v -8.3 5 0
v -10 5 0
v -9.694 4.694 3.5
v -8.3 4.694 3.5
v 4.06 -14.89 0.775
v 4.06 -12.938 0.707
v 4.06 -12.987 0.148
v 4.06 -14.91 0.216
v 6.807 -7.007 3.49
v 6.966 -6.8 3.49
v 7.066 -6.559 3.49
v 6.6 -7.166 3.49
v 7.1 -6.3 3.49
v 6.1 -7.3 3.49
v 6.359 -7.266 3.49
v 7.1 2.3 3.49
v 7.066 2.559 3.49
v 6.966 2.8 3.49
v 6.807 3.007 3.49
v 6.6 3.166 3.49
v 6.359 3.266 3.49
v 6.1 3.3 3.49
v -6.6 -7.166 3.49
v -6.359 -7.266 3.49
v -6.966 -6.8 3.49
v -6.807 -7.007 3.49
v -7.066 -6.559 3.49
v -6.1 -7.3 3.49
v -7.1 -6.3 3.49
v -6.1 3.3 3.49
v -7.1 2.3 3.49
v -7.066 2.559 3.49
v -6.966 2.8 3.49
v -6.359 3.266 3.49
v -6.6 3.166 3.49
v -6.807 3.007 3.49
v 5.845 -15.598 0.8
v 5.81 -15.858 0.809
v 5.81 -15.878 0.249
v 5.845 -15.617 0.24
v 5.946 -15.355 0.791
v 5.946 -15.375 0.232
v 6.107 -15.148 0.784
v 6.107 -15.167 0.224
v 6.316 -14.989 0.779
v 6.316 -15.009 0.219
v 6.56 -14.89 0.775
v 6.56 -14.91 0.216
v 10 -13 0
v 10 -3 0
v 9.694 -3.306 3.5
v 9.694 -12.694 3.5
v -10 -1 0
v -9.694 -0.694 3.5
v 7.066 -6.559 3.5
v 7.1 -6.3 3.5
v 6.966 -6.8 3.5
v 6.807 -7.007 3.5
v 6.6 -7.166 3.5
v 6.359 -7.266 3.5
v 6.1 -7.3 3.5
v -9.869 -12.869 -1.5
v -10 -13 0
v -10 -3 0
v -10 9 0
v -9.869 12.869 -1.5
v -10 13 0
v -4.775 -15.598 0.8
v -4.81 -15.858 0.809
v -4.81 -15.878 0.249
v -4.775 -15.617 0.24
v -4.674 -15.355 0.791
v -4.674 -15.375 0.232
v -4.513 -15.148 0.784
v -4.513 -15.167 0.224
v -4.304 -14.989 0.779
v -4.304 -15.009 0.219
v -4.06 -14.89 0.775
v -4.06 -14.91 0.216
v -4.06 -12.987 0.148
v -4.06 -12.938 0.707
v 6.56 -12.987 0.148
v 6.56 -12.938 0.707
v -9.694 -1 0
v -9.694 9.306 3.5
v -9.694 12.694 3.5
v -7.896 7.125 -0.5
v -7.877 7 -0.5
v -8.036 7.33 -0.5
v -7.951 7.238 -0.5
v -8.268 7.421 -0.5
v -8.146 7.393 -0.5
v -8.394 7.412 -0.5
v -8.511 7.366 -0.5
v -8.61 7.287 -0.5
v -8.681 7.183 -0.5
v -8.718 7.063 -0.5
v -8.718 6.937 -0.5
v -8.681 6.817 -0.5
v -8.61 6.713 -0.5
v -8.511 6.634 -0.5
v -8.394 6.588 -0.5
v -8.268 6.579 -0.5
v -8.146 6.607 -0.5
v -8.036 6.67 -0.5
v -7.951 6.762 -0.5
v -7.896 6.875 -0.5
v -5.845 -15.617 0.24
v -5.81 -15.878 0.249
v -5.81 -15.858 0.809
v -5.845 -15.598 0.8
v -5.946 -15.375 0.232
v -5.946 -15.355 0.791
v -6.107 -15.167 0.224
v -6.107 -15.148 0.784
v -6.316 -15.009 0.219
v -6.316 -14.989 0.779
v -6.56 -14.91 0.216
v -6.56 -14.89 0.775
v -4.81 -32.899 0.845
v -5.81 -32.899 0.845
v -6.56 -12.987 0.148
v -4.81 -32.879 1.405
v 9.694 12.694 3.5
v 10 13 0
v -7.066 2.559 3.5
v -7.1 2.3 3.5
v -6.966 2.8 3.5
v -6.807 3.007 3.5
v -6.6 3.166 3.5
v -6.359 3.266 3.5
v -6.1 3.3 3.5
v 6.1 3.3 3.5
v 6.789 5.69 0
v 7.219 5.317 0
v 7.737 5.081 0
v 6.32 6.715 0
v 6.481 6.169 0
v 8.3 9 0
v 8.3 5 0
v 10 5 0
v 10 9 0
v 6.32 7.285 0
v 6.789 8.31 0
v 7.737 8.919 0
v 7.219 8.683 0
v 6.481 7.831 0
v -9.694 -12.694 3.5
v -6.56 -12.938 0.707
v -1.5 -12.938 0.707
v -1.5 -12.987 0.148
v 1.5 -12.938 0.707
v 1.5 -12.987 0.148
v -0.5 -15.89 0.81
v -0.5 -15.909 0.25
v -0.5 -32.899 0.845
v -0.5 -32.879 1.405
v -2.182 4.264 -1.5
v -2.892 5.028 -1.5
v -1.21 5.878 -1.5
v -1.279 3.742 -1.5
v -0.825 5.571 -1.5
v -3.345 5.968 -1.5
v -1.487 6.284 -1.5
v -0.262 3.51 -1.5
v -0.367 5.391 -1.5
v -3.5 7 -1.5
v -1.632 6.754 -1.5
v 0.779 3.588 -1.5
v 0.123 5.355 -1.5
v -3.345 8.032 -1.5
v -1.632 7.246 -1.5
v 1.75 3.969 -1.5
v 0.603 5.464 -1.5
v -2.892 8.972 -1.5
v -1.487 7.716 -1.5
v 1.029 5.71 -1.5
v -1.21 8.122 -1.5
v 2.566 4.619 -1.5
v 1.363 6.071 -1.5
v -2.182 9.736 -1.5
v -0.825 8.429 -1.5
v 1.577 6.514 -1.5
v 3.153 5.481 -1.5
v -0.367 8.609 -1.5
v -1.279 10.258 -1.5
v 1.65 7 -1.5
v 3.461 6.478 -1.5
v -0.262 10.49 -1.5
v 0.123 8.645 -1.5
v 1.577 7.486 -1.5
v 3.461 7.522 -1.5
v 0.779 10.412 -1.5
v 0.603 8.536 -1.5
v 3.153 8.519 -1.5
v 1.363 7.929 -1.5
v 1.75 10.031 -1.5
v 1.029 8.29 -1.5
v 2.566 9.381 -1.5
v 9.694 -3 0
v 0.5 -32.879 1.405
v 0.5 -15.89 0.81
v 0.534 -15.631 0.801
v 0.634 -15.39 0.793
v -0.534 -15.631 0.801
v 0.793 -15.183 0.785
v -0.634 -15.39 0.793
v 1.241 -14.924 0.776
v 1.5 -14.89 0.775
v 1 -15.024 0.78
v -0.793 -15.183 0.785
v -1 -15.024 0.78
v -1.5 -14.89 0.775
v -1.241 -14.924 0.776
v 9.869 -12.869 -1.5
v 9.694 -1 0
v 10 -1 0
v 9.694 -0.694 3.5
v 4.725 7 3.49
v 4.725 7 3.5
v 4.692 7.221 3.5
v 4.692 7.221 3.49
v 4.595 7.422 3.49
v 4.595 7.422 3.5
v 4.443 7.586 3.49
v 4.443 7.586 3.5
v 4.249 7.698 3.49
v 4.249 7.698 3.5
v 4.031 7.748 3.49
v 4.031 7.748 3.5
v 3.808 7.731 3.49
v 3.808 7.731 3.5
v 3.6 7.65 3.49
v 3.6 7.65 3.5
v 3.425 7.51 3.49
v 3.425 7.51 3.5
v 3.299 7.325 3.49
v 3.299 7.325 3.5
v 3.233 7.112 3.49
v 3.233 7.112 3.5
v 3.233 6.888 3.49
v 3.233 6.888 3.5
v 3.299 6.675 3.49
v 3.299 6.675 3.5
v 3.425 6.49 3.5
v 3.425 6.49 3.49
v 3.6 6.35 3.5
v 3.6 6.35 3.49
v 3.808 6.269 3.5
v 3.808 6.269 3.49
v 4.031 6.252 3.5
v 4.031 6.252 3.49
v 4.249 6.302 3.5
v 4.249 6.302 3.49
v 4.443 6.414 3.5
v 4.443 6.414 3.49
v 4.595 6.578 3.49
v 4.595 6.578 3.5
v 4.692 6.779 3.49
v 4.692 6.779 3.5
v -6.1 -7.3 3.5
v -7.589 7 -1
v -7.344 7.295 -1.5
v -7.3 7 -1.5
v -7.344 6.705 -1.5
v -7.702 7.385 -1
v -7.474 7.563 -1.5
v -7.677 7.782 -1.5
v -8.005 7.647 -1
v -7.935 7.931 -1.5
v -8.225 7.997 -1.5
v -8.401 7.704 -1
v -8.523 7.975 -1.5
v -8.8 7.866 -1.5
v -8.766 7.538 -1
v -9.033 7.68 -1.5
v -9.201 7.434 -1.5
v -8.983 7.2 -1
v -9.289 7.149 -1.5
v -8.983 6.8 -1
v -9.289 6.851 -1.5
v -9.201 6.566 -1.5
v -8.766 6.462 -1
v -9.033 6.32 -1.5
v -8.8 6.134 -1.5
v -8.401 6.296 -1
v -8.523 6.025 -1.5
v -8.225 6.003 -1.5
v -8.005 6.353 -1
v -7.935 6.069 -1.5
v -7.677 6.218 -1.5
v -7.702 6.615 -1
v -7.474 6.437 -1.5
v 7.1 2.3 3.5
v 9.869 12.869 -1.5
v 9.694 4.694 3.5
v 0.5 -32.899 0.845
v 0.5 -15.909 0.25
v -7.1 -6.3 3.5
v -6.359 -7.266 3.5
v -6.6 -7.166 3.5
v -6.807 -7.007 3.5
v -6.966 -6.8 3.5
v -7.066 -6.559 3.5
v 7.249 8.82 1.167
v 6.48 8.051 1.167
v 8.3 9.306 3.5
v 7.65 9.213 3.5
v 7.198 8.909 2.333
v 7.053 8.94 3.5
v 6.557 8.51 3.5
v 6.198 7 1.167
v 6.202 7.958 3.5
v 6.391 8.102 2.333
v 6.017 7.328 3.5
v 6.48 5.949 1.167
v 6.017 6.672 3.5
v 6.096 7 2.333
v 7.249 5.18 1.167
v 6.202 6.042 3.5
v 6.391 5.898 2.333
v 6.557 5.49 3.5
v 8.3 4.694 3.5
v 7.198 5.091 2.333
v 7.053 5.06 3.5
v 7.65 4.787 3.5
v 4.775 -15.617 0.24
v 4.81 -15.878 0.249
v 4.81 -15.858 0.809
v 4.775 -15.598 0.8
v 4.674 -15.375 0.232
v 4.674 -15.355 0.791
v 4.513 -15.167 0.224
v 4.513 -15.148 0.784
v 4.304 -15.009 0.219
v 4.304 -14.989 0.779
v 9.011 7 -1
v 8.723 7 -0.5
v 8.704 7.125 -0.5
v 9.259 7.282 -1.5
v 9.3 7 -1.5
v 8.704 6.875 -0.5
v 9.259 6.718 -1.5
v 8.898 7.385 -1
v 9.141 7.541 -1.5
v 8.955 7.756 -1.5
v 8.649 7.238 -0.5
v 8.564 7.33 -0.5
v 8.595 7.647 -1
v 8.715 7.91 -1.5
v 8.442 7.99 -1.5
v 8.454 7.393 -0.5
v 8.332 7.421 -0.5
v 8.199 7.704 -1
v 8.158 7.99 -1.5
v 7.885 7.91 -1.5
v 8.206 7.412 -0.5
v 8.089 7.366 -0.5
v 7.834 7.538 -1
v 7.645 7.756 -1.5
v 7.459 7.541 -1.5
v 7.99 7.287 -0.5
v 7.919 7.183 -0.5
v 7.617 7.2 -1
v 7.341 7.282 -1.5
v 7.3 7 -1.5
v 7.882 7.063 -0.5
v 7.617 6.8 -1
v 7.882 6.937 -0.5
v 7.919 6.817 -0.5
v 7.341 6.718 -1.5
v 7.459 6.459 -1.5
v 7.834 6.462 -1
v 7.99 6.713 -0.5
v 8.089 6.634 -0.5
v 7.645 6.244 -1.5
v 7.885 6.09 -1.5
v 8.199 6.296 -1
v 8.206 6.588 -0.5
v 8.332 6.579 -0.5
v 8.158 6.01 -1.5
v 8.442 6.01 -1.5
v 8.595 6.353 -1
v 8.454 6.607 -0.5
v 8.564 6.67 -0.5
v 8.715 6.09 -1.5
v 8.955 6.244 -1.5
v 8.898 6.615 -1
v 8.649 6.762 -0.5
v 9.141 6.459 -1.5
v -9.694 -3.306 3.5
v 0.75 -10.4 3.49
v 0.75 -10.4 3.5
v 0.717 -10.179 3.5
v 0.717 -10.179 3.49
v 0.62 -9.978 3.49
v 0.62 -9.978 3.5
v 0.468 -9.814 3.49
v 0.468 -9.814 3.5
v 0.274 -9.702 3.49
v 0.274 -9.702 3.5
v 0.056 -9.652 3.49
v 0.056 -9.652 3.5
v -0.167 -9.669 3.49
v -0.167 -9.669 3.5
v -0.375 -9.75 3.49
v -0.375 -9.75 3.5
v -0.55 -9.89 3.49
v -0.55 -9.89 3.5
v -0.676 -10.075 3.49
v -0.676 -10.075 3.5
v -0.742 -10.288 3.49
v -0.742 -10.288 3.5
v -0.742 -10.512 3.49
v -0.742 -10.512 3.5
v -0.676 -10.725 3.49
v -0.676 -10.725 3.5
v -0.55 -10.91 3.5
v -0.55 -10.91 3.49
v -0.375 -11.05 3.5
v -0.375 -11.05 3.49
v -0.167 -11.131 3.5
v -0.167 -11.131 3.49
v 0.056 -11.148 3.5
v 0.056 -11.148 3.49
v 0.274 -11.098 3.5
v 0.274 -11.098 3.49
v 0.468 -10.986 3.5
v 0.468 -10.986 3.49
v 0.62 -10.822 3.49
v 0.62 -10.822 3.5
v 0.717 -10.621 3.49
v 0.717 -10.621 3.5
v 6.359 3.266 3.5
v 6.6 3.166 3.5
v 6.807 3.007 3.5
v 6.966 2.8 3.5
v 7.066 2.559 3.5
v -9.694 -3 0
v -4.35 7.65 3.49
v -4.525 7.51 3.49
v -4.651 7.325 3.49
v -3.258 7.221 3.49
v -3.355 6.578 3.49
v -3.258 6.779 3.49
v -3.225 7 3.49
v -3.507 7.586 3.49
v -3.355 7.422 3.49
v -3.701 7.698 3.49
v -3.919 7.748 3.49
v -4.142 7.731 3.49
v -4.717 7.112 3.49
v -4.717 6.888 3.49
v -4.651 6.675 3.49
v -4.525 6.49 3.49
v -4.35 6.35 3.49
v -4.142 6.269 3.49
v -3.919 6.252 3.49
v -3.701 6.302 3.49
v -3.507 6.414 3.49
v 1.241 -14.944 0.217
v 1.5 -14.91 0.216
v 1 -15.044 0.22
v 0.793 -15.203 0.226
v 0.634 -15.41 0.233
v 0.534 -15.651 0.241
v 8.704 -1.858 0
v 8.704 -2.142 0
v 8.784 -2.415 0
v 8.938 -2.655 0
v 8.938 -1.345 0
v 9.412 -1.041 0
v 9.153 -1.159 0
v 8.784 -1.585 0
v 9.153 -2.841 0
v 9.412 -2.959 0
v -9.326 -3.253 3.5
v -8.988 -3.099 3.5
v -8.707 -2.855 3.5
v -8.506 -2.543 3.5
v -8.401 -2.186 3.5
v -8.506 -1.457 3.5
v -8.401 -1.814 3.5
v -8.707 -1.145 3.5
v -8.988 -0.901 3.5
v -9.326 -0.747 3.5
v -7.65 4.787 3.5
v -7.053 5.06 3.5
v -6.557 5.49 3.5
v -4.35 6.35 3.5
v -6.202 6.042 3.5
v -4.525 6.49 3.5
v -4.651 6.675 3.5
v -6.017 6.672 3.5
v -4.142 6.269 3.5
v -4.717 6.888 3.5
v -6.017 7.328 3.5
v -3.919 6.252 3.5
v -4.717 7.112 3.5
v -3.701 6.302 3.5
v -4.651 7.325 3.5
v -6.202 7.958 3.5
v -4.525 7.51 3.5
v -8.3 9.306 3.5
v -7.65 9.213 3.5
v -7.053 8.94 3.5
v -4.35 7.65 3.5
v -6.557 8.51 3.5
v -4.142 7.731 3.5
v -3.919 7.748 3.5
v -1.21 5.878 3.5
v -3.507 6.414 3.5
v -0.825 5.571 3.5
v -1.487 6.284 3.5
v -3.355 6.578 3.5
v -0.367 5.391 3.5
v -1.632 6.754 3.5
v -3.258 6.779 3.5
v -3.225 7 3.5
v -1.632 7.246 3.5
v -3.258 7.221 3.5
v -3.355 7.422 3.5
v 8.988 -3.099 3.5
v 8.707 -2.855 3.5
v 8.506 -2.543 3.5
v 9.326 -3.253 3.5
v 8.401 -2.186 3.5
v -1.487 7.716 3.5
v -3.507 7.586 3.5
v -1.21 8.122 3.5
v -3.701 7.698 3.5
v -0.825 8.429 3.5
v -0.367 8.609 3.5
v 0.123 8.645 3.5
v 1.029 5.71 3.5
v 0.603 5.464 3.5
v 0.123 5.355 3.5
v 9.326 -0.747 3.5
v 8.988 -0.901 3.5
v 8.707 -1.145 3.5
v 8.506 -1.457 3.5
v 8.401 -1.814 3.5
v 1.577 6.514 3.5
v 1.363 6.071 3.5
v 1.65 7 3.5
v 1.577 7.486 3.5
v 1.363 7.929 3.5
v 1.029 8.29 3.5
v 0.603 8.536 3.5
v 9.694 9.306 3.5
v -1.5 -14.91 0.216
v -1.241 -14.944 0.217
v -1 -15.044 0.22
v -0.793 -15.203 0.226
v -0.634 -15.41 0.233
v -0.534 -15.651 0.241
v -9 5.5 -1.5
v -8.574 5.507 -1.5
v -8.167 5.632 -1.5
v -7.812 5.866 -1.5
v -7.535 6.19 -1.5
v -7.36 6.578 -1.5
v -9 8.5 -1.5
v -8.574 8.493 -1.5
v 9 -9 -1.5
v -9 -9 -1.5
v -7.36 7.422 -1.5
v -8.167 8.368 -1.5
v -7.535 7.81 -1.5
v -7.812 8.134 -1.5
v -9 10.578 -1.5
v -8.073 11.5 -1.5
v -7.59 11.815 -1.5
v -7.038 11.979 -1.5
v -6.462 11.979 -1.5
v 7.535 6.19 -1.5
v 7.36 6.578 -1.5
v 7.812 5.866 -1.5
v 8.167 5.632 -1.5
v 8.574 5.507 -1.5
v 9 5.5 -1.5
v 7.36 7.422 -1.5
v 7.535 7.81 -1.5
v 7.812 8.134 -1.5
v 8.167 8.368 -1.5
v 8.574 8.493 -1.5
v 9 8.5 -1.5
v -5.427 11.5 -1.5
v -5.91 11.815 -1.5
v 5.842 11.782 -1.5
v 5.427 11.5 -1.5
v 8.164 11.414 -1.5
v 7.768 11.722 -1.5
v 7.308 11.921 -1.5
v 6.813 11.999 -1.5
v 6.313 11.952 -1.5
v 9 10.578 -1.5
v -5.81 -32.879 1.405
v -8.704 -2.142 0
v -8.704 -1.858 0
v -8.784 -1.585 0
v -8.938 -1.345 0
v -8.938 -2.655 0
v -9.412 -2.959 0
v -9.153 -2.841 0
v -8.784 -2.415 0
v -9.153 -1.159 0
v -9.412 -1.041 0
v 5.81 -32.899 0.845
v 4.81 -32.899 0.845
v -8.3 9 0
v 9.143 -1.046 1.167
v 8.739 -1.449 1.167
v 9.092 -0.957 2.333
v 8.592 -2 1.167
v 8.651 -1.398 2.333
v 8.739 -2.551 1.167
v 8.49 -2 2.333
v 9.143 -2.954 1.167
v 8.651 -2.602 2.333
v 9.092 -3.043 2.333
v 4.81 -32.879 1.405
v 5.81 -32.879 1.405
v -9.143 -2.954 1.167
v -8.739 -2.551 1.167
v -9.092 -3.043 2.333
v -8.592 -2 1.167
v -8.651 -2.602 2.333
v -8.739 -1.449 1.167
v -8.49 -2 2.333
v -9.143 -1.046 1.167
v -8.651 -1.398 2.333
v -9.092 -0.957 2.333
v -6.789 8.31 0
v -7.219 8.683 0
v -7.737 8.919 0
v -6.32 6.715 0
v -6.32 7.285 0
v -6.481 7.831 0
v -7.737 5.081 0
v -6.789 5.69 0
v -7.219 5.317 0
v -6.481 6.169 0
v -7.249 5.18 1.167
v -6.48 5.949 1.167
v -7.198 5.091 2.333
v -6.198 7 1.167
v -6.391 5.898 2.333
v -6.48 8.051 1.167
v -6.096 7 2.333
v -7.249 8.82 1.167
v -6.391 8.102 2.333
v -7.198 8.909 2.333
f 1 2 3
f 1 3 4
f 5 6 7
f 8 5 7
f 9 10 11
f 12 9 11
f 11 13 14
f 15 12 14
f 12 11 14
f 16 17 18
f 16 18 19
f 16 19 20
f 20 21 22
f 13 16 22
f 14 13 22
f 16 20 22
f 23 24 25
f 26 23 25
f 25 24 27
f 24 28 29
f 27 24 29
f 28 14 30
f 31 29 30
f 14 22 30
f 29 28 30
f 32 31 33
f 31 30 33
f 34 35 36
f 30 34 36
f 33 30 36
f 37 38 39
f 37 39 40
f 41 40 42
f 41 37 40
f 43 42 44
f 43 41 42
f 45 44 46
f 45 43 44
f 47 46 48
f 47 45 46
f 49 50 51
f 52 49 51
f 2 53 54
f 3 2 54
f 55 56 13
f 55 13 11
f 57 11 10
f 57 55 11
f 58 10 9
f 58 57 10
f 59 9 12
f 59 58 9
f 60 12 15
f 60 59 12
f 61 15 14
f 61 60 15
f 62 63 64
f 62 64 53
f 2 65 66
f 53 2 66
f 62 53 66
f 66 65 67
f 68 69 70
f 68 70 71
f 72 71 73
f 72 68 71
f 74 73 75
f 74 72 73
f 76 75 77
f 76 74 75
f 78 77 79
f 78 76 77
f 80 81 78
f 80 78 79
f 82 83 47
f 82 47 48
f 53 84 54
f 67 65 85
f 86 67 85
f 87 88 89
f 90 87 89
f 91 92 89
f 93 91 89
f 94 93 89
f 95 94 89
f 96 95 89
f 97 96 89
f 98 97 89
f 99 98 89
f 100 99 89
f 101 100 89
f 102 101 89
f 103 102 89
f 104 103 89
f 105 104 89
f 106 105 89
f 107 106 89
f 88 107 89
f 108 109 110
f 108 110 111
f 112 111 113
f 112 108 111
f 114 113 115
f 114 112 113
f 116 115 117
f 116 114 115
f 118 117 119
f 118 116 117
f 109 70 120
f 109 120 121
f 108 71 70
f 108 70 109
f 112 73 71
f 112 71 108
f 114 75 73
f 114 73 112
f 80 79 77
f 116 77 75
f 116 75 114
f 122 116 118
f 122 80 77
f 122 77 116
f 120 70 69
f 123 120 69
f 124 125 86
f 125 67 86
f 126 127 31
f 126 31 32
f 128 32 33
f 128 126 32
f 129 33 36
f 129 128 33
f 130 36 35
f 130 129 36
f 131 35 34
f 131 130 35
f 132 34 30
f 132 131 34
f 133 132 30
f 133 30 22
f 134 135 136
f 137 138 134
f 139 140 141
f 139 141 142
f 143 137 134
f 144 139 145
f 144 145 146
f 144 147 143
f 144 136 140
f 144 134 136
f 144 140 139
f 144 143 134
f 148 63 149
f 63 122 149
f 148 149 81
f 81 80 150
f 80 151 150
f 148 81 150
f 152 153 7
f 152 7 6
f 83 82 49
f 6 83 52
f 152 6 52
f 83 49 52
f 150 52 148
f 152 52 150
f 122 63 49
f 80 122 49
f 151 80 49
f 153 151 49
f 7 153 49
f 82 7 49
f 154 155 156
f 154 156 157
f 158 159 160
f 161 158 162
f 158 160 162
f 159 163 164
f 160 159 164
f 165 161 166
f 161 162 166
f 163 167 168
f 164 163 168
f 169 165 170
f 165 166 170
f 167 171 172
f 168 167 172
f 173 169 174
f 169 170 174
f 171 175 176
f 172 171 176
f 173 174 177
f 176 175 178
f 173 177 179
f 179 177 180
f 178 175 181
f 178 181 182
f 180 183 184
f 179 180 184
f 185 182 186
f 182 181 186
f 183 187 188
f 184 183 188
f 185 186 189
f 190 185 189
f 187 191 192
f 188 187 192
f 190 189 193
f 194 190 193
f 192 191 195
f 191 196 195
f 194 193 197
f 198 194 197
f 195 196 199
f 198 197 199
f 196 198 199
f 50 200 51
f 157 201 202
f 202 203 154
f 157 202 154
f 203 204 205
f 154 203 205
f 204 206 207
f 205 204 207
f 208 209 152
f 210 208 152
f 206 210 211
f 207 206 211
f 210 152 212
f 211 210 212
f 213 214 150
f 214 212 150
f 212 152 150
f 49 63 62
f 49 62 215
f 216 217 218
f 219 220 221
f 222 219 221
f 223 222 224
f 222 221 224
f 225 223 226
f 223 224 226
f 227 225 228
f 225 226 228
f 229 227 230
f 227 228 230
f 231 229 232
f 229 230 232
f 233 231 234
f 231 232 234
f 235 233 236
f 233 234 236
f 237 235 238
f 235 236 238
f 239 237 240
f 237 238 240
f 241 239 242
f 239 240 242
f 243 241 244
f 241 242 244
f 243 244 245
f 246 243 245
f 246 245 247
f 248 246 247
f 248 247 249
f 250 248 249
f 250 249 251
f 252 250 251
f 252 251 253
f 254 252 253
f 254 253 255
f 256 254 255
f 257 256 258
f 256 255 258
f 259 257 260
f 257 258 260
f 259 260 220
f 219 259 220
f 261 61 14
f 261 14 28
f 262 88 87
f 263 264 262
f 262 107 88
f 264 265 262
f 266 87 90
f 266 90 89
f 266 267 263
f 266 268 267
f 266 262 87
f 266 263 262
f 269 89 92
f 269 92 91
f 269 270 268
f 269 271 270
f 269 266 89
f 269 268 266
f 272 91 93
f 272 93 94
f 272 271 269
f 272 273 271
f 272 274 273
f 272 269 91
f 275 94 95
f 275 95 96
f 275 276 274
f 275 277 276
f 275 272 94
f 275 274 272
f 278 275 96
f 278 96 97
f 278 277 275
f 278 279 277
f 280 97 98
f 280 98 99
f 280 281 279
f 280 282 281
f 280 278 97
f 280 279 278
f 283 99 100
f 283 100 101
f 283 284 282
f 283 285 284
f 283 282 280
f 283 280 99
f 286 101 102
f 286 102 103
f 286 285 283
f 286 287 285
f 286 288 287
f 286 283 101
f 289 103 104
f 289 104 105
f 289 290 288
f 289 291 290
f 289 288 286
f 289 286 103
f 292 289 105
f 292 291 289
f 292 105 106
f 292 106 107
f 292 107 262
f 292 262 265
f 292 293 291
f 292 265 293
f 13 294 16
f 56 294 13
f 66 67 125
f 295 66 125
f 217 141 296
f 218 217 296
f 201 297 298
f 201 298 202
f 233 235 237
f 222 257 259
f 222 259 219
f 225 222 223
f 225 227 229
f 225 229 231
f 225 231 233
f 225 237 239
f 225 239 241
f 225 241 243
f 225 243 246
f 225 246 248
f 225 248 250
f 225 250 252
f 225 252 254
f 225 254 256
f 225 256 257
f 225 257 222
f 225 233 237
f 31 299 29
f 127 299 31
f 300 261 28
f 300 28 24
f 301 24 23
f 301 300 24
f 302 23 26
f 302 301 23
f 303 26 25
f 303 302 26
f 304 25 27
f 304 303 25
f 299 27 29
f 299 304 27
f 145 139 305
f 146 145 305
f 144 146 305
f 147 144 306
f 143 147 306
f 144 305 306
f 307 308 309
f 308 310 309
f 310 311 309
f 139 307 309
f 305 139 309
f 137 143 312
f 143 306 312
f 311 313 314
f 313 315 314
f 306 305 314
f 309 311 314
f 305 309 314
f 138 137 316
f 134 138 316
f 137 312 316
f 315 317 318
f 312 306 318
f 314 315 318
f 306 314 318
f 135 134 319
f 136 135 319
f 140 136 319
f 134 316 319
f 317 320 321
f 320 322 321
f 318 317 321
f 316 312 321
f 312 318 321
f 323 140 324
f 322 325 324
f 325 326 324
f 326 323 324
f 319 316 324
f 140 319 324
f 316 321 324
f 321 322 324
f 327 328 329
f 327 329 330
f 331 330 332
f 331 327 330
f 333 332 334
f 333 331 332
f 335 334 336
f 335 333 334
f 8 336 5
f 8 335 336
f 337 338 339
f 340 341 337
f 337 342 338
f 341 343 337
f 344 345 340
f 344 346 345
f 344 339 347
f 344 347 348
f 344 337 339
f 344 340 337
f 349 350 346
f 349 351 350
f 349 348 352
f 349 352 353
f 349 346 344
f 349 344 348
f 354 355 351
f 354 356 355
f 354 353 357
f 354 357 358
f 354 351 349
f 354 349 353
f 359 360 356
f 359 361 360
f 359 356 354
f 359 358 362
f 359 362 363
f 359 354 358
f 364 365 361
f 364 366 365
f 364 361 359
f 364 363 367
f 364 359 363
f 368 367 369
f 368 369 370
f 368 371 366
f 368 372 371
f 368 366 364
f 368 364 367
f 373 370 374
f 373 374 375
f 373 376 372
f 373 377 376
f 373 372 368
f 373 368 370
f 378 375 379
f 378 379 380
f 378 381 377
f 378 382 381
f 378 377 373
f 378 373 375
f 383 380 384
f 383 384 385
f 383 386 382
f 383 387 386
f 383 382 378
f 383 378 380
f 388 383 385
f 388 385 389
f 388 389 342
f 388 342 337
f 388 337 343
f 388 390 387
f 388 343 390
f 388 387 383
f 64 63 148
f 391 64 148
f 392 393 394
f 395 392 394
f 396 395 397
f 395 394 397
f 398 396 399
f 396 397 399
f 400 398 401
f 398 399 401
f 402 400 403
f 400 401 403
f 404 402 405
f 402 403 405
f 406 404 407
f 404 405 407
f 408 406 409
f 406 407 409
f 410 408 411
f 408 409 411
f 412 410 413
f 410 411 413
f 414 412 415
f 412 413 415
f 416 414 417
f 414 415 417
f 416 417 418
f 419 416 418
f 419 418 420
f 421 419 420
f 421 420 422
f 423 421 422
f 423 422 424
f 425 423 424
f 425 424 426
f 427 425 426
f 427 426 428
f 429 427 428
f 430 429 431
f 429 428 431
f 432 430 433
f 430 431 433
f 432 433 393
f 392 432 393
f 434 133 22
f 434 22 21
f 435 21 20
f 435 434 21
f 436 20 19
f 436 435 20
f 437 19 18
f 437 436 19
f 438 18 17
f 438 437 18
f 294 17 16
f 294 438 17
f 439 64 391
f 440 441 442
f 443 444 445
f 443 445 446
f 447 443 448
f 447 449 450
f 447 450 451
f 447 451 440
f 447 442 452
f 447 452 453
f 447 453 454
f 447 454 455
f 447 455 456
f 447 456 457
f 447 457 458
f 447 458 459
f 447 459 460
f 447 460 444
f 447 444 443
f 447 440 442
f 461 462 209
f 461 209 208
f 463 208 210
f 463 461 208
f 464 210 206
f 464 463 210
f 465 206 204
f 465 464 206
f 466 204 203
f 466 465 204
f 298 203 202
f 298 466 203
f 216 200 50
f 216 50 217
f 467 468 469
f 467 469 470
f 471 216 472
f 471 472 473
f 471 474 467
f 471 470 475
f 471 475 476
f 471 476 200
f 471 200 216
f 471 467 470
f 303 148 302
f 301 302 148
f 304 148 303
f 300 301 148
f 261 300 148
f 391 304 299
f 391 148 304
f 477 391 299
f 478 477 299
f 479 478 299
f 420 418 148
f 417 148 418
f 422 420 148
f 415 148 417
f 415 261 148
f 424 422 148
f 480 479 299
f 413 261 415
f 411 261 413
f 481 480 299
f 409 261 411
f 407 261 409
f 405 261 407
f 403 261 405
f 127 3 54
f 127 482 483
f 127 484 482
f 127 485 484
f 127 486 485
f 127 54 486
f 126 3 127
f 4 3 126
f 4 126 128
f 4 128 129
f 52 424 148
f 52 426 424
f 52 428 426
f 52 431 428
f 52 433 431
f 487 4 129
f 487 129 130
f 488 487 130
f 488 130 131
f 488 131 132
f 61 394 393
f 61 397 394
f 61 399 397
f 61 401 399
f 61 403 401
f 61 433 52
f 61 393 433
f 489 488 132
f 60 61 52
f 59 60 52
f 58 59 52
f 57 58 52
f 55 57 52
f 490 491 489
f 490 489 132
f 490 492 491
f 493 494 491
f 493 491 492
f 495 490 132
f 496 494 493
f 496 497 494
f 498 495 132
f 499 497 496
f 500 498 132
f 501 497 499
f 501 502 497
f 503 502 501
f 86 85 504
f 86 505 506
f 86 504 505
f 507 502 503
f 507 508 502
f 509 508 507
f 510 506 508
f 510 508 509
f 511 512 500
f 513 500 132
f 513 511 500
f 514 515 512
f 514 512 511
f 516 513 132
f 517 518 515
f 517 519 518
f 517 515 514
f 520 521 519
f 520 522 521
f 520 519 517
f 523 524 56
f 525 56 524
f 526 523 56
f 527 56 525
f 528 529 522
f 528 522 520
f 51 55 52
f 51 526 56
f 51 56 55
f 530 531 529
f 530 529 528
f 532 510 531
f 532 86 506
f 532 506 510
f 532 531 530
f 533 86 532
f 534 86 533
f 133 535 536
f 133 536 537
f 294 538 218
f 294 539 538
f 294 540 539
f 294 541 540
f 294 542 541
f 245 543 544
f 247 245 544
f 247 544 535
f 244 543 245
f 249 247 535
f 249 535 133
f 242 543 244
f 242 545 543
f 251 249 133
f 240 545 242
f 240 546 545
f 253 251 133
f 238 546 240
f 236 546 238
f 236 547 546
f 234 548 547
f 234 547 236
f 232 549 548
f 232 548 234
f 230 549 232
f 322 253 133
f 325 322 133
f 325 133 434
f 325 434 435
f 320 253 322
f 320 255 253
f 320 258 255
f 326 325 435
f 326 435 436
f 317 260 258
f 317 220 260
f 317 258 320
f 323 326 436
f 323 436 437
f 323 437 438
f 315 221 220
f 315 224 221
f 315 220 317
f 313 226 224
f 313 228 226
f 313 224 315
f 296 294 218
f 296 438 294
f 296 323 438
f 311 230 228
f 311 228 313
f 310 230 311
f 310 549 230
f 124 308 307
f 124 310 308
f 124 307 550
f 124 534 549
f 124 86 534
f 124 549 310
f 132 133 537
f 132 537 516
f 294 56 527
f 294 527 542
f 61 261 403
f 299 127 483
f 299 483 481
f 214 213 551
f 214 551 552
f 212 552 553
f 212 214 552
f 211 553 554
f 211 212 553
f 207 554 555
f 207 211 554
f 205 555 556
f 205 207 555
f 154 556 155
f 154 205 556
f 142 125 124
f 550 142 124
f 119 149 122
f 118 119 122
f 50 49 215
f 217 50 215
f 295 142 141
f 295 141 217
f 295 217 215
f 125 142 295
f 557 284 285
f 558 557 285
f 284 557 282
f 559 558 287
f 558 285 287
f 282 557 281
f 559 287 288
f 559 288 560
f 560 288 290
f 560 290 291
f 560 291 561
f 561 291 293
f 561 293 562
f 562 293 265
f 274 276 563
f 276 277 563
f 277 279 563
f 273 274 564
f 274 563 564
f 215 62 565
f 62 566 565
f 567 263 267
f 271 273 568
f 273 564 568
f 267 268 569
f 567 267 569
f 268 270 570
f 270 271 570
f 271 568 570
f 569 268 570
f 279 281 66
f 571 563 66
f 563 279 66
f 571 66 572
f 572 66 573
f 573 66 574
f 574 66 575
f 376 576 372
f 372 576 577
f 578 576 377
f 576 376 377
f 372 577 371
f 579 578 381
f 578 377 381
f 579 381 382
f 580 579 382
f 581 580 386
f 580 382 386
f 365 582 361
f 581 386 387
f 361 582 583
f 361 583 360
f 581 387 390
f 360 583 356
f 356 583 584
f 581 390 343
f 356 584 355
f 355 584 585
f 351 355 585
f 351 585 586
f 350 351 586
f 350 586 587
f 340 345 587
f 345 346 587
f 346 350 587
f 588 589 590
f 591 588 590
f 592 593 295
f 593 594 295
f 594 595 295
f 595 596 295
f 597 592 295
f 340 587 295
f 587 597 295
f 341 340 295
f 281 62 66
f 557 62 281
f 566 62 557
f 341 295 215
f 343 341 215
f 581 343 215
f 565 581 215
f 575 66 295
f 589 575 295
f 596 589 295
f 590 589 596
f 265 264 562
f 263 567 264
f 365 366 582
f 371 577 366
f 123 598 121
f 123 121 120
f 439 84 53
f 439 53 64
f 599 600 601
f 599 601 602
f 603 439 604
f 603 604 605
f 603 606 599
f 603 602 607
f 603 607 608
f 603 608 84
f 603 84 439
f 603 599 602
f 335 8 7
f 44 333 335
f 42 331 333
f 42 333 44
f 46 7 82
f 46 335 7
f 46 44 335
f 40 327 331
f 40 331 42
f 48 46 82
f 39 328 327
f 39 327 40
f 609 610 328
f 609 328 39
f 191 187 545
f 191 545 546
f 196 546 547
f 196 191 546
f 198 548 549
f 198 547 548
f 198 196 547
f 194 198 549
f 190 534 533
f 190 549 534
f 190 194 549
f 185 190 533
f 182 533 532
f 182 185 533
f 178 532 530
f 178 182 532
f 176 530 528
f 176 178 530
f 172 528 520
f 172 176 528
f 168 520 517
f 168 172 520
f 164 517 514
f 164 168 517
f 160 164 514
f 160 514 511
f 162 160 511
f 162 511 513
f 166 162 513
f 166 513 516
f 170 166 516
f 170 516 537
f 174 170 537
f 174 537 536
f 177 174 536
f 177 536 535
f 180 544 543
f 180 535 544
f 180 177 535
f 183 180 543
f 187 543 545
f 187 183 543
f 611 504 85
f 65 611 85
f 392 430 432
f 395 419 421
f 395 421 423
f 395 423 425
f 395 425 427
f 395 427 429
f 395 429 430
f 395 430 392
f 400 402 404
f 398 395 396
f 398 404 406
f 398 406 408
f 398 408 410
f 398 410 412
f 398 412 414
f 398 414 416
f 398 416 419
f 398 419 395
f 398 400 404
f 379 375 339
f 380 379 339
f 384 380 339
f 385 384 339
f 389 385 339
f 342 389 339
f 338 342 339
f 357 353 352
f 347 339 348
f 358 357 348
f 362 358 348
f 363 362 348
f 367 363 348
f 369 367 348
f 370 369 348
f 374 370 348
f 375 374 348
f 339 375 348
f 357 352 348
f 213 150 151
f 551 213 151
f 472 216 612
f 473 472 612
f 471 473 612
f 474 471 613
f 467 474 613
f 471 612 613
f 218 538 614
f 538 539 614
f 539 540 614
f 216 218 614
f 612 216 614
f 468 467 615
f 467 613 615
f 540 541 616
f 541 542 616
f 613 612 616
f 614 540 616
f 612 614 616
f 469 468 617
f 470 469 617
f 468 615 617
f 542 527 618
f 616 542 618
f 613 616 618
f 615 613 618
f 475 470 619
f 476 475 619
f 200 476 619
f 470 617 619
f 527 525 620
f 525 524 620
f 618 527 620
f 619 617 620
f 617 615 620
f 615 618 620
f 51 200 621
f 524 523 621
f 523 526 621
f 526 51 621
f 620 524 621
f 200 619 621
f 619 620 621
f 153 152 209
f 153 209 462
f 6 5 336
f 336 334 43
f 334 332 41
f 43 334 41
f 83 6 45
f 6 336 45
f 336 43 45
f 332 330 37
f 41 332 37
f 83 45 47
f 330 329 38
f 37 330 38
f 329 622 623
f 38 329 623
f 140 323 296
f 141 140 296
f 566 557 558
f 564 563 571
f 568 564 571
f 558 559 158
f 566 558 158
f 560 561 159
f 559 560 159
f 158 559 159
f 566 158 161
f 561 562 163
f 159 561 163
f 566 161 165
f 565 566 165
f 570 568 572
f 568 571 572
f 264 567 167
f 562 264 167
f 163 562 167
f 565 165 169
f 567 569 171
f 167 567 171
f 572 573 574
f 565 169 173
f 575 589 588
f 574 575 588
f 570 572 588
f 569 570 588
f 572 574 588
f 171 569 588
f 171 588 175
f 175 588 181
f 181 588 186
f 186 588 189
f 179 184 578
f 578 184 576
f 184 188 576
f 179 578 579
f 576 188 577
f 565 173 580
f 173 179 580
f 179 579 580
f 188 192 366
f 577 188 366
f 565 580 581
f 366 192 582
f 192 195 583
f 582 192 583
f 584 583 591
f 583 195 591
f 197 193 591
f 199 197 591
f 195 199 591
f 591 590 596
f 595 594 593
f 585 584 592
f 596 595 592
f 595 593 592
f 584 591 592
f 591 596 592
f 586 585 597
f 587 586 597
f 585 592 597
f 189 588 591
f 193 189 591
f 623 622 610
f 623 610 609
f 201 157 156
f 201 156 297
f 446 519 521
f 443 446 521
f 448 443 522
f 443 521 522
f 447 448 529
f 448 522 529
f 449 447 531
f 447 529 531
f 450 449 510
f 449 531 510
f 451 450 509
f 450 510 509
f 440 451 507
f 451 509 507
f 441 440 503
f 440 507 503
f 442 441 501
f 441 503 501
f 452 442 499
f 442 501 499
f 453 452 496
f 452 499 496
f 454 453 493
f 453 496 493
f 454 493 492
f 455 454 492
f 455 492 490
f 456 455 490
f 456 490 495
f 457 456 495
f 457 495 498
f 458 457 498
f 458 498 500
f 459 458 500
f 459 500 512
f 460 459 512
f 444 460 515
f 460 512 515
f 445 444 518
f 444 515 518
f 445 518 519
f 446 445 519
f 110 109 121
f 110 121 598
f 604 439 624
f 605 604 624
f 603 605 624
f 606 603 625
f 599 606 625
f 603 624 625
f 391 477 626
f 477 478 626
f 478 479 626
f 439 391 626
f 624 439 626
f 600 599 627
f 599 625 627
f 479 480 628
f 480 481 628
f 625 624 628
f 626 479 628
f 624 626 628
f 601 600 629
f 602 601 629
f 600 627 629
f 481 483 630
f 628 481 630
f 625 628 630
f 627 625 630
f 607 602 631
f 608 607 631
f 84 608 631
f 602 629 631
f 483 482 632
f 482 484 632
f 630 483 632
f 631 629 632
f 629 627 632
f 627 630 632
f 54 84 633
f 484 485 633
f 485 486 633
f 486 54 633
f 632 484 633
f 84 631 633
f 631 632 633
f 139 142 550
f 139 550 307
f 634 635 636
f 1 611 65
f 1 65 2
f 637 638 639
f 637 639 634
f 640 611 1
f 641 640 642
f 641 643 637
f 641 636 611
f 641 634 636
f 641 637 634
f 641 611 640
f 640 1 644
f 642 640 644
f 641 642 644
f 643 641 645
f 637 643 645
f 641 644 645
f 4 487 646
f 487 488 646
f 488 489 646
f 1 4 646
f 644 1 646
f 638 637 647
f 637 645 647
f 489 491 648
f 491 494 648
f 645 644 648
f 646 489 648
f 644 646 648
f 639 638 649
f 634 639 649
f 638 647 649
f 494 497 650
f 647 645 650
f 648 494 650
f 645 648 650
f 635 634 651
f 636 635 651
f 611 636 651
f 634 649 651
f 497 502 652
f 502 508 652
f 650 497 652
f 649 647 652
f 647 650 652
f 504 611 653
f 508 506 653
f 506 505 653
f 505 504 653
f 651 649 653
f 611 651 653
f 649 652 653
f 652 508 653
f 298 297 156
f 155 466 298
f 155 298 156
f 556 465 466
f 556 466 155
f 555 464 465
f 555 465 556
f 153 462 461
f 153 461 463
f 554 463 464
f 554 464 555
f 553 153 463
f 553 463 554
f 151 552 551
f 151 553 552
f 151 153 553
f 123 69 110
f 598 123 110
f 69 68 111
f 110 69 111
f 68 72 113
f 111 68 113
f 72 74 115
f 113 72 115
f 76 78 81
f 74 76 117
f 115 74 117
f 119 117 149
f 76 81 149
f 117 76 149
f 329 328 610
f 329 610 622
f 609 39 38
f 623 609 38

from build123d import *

# Parameters (mm, degrees)
SKETCH1_W                    = 20
SKETCH1_H                    = 26
BOSS_EXTRUDE1_DEPTH          = 1.5
BOSS_EXTRUDE1_DRAFT          = -5
SKETCH1_2_W                  = 20
SKETCH1_2_H                  = 26
BOSS_EXTRUDE2_DEPTH          = 3.5
BOSS_EXTRUDE2_TAPER          = 5
CUT_EXTRUDE1_DEPTH           = 3.5
CUT_EXTRUDE1_TAPER           = -5
CUT_EXTRUDE1_2_DEPTH         = 3.5
CUT_EXTRUDE1_2_TAPER         = -5
CUT_EXTRUDE1_3_DEPTH         = 3.5
CUT_EXTRUDE1_3_TAPER         = -5
CUT_EXTRUDE1_4_DEPTH         = 3.5
CUT_EXTRUDE1_4_TAPER         = -5
CUT_EXTRUDE3_DEPTH           = 17.770509989
CUT_EXTRUDE3_DEPTH_BACK      = 17.770509989
SKETCH5_5_R                  = 1.65
CUT_EXTRUDE4_START           = 3.5
SKETCH5_8_R                  = 0.75
CUT_EXTRUDE4_DEPTH           = 0.01
CUT_EXTRUDE5_START           = -1.5
SKETCH5_9_R                  = 1
CUT_EXTRUDE5_DEPTH           = 1
CUT_EXTRUDE5_DRAFT           = 30
CUT_EXTRUDE5_PROFILE_2_DEPTH = 1
CUT_EXTRUDE5_PROFILE_2_DRAFT = 30
SKETCH6_R                    = 3.5
CUT_EXTRUDE6_DEPTH           = 0.0001
SKETCH7_W                    = 3
SKETCH7_H                    = 0.56
SKETCH7_W_2                  = 2.5
BOSS_EXTRUDE3_DEPTH          = 2.1
SKETCH8_W                    = 1
SKETCH8_H                    = 0.56
BOSS_EXTRUDE4_DEPTH          = 18
FILLET1_R                    = 1


# Read off the part's stored shape, not the designer's step: Cut-Extrude1
with BuildPart() as part:
    # Sketch1 → Boss-Extrude1 (with draft: the straight prism first)
    with BuildSketch(Plane.XY):
        Rectangle(SKETCH1_W, SKETCH1_H)
    extrude(amount=-BOSS_EXTRUDE1_DEPTH)
    # Boss-Extrude1: the draft: its side faces are tilted about the plane it starts from
    boss_extrude1_sides = [part.faces().sort_by_distance(p)[0] for p in [
        (-10, 0, -0.75),
        (0, -13, -0.75),
        (10, 0, -0.75),
        (0, 13, -0.75),
    ]]
    draft(boss_extrude1_sides, Plane.XY, BOSS_EXTRUDE1_DRAFT)

    # Sketch1<2> → Boss-Extrude2 (add)
    with BuildSketch(Plane.XY):
        Rectangle(SKETCH1_2_W, SKETCH1_2_H)
    extrude(amount=BOSS_EXTRUDE2_DEPTH, taper=BOSS_EXTRUDE2_TAPER)

    # Cut-Extrude1 outline → Cut-Extrude1 (cut)
    with BuildSketch(Plane.XY):
        with BuildLine():
            Line((10, -1), (9.693789678, -1))
            ThreePointArc((9.693789678, -1), (8.693789678, -2), (9.693789678, -3))
            Line((9.693789678, -3), (10, -3))
            Line((10, -3), (10, -1))
        make_face()
    extrude(amount=CUT_EXTRUDE1_DEPTH, taper=CUT_EXTRUDE1_TAPER, mode=Mode.SUBTRACT)

    # Cut-Extrude1 2 outline → Cut-Extrude1 2 (cut)
    with BuildSketch(Plane.XY):
        with BuildLine():
            Line((-9.693789678, -1), (-10, -1))
            Line((-10, -1), (-10, -3))
            Line((-10, -3), (-9.693789678, -3))
            ThreePointArc((-9.693789678, -3), (-8.693789678, -2), (-9.693789678, -1))
        make_face()
    extrude(amount=CUT_EXTRUDE1_2_DEPTH, taper=CUT_EXTRUDE1_2_TAPER, mode=Mode.SUBTRACT)

    # Cut-Extrude1 3 outline → Cut-Extrude1 3 (cut)
    with BuildSketch(Plane.XY):
        with BuildLine():
            Line((-8.3, 9), (-10, 9))
            Line((-10, 9), (-10, 5))
            Line((-10, 5), (-8.3, 5))
            ThreePointArc((-8.3, 5), (-6.3, 7), (-8.3, 9))
        make_face()
    extrude(amount=CUT_EXTRUDE1_3_DEPTH, taper=CUT_EXTRUDE1_3_TAPER, mode=Mode.SUBTRACT)

    # Cut-Extrude1 4 outline → Cut-Extrude1 4 (cut)
    with BuildSketch(Plane.XY):
        with BuildLine():
            Line((10, 9), (8.3, 9))
            ThreePointArc((8.3, 9), (6.3, 7), (8.3, 5))
            Line((8.3, 5), (10, 5))
            Line((10, 5), (10, 9))
        make_face()
    extrude(amount=CUT_EXTRUDE1_4_DEPTH, taper=CUT_EXTRUDE1_4_TAPER, mode=Mode.SUBTRACT)

    # Sketch5<5> → Cut-Extrude3 (cut, two sides: drawn at the far end of the back side and taken through both)
    with BuildSketch(Plane.XY.offset(-CUT_EXTRUDE3_DEPTH_BACK)):
        with Locations((0, 7)):
            Circle(SKETCH5_5_R)
    extrude(amount=CUT_EXTRUDE3_DEPTH + CUT_EXTRUDE3_DEPTH_BACK, mode=Mode.SUBTRACT)

    # Sketch5<8> → Cut-Extrude4 (cut)
    with BuildSketch(Plane.XY.offset(CUT_EXTRUDE4_START)):
        with Locations((3.975, 7)):
            Circle(SKETCH5_8_R)
        with Locations((-3.975, 7)):
            Circle(SKETCH5_8_R)
        with Locations((0, -10.4)):
            Circle(SKETCH5_8_R)
        with BuildLine():
            Line((-6.1, 3.3), (6.1, 3.3))
            ThreePointArc((6.1, 3.3), (6.807106781, 3.007106781), (7.1, 2.3))
            Line((7.1, 2.3), (7.1, -6.3))
            ThreePointArc((7.1, -6.3), (6.807106781, -7.007106781), (6.1, -7.3))
            Line((6.1, -7.3), (-6.1, -7.3))
            ThreePointArc((-6.1, -7.3), (-6.807106781, -7.007106781), (-7.1, -6.3))
            Line((-7.1, -6.3), (-7.1, 2.3))
            ThreePointArc((-7.1, 2.3), (-6.807106781, 3.007106781), (-6.1, 3.3))
        make_face()
    extrude(amount=-CUT_EXTRUDE4_DEPTH, mode=Mode.SUBTRACT)


with BuildPart() as cut_extrude5_tool:
    # Sketch5<9> → Cut-Extrude5 (with draft: the straight prism first)
    with BuildSketch(Plane.XY.offset(CUT_EXTRUDE5_START)):
        with Locations((8.3, 7)):
            Circle(SKETCH5_9_R)
    extrude(amount=CUT_EXTRUDE5_DEPTH)
    # Cut-Extrude5: the draft: its side faces are tilted about the plane it starts from
    cut_extrude5_sides = [cut_extrude5_tool.faces().sort_by_distance(p)[0] for p in [
        (7.3, 7, -1),
    ]]
    draft(cut_extrude5_sides, Plane.XY.offset(CUT_EXTRUDE5_START), CUT_EXTRUDE5_DRAFT)


with BuildPart() as part_1:
    add(part.part)

    # Cut-Extrude5: cut by cut_extrude5_tool
    add(cut_extrude5_tool.part, mode=Mode.SUBTRACT)


with BuildPart() as cut_extrude5_profile_2_tool:
    # Sketch5<9> → Cut-Extrude5 profile 2 (with draft: the straight prism first)
    with BuildSketch(Plane.XY.offset(CUT_EXTRUDE5_START)):
        with Locations((-8.3, 7)):
            Circle(SKETCH5_9_R)
    extrude(amount=CUT_EXTRUDE5_PROFILE_2_DEPTH)
    # Cut-Extrude5 profile 2: the draft: its side faces are tilted about the plane it starts from
    cut_extrude5_profile_2_sides = [cut_extrude5_profile_2_tool.faces().sort_by_distance(p)[0] for p in [
        (-9.3, 7, -1),
    ]]
    draft(cut_extrude5_profile_2_sides, Plane.XY.offset(CUT_EXTRUDE5_START), CUT_EXTRUDE5_PROFILE_2_DRAFT)


with BuildPart() as part_2:
    add(part_1.part)

    # Cut-Extrude5 profile 2: cut by cut_extrude5_profile_2_tool
    add(cut_extrude5_profile_2_tool.part, mode=Mode.SUBTRACT)

    # Sketch6 → Cut-Extrude6 (cut)
    with BuildSketch(Plane(origin=(0, 0, -1.5), x_dir=(-1, 0, 0), z_dir=(0, 0, -1))):
        with BuildLine():
            Line((-5.427124344, 11.5), (5.427124344, 11.5))
            ThreePointArc((5.427124344, 11.5), (6.75, 12), (8.072875656, 11.5))
            Line((8.072875656, 11.5), (9, 10.578427125))
            Line((9, 10.578427125), (9, 8.5))
            ThreePointArc((9, 8.5), (7.3, 7), (9, 5.5))
            Line((9, 5.5), (9, -9))
            Line((9, -9), (-9, -9))
            Line((-9, -9), (-9, 5.5))
            ThreePointArc((-9, 5.5), (-7.3, 7), (-9, 8.5))
            Line((-9, 8.5), (-9, 10.578427125))
            Line((-9, 10.578427125), (-8.164213562, 11.414213562))
            ThreePointArc((-8.164213562, 11.414213562), (-6.812653663, 11.999018389), (-5.427124344, 11.5))
        make_face()
        with Locations((0, 7)):
            Circle(SKETCH6_R, mode=Mode.SUBTRACT)
    extrude(amount=-CUT_EXTRUDE6_DEPTH, mode=Mode.SUBTRACT)

    # Sketch7 → Boss-Extrude3 (add)
    with BuildSketch(Plane(origin=(0, -12.800597138, 0.447962854), x_dir=(-1, 0, 0), z_dir=(0, -0.9993882205697596, 0.034974055904479696))):
        with Locations((0, 0.026094538)):
            Rectangle(SKETCH7_W, SKETCH7_H)
        with Locations((-5.31, 0.026094538)):
            Rectangle(SKETCH7_W_2, SKETCH7_H)
        with Locations((5.31, 0.026094538)):
            Rectangle(SKETCH7_W_2, SKETCH7_H)
    extrude(amount=BOSS_EXTRUDE3_DEPTH)

    # Sketch8 → Boss-Extrude4 (add)
    with BuildSketch(Plane(origin=(0, -14.899312401, 0.521408372), x_dir=(1, 0, 0), z_dir=(0, -0.9993882205697596, 0.03497405590447946))):
        with Locations((5.31, -0.026094538)):
            Rectangle(SKETCH8_W, SKETCH8_H)
        with Locations((0, -0.026094538)):
            Rectangle(SKETCH8_W, SKETCH8_H)
        with Locations((-5.31, -0.026094538)):
            Rectangle(SKETCH8_W, SKETCH8_H)
    extrude(amount=BOSS_EXTRUDE4_DEPTH)

    # Fillet1
    # the kernel refuses this fillet: 1 mm, written as the material it adds along each edge
    with BuildSketch(Plane(origin=(4.81, -14.910017769, 0.215501096), x_dir=(-1, 0, 0), z_dir=(0, 0.03497405590447946, 0.9993882205697596)), Plane(origin=(5.81, -14.890432297, 0.7751585), x_dir=(1, 0, 0), z_dir=(0, -0.03497405590447946, -0.9993882205697596)), Plane(origin=(-5.81, -14.910017769, 0.215501096), x_dir=(-1, 0, 0), z_dir=(0, 0.03497405590447946, 0.9993882205697596)), Plane(origin=(-4.81, -14.890432297, 0.7751585), x_dir=(1, 0, 0), z_dir=(0, -0.03497405590447946, -0.9993882205697596))) as fillet1_piece_1:
        with BuildLine():
            CenterArc((1, 0.968245837), FILLET1_R, 180, 75.522487814)
            Line((0, 0.968245837), (-0.02, 0.968245837))
            Line((-0.02, 0.968245837), (-0.02, 0))
            Line((-0.02, 0), (0, -0.02))
            ThreePointArc((0, -0.02), (0.375, -0.02), (0.745, -0.019364917))
            Line((0.745, -0.019364917), (0.75, 0))
        make_face()
    extrude(amount=0.56)
    with BuildSketch(Plane(origin=(0.5, -14.910017769, 0.215501096), x_dir=(1, 0, 0), z_dir=(0, 0.03497405590447946, 0.9993882205697596)), Plane(origin=(-0.5, -14.890432297, 0.7751585), x_dir=(-1, 0, 0), z_dir=(0, -0.03497405590447946, -0.9993882205697596))) as fillet1_piece_2:
        with BuildLine():
            CenterArc((FILLET1_R, -FILLET1_R), FILLET1_R, 90, 90)
            Line((0, -FILLET1_R), (-FILLET1_R * 0.02, -FILLET1_R))
            Line((-FILLET1_R * 0.02, -FILLET1_R), (-FILLET1_R * 0.02, FILLET1_R * 0.02))
            Line((-FILLET1_R * 0.02, FILLET1_R * 0.02), (FILLET1_R, FILLET1_R * 0.02))
            Line((FILLET1_R, FILLET1_R * 0.02), (FILLET1_R, 0))
        make_face()
    extrude(amount=0.56)


solid = part_2.part
